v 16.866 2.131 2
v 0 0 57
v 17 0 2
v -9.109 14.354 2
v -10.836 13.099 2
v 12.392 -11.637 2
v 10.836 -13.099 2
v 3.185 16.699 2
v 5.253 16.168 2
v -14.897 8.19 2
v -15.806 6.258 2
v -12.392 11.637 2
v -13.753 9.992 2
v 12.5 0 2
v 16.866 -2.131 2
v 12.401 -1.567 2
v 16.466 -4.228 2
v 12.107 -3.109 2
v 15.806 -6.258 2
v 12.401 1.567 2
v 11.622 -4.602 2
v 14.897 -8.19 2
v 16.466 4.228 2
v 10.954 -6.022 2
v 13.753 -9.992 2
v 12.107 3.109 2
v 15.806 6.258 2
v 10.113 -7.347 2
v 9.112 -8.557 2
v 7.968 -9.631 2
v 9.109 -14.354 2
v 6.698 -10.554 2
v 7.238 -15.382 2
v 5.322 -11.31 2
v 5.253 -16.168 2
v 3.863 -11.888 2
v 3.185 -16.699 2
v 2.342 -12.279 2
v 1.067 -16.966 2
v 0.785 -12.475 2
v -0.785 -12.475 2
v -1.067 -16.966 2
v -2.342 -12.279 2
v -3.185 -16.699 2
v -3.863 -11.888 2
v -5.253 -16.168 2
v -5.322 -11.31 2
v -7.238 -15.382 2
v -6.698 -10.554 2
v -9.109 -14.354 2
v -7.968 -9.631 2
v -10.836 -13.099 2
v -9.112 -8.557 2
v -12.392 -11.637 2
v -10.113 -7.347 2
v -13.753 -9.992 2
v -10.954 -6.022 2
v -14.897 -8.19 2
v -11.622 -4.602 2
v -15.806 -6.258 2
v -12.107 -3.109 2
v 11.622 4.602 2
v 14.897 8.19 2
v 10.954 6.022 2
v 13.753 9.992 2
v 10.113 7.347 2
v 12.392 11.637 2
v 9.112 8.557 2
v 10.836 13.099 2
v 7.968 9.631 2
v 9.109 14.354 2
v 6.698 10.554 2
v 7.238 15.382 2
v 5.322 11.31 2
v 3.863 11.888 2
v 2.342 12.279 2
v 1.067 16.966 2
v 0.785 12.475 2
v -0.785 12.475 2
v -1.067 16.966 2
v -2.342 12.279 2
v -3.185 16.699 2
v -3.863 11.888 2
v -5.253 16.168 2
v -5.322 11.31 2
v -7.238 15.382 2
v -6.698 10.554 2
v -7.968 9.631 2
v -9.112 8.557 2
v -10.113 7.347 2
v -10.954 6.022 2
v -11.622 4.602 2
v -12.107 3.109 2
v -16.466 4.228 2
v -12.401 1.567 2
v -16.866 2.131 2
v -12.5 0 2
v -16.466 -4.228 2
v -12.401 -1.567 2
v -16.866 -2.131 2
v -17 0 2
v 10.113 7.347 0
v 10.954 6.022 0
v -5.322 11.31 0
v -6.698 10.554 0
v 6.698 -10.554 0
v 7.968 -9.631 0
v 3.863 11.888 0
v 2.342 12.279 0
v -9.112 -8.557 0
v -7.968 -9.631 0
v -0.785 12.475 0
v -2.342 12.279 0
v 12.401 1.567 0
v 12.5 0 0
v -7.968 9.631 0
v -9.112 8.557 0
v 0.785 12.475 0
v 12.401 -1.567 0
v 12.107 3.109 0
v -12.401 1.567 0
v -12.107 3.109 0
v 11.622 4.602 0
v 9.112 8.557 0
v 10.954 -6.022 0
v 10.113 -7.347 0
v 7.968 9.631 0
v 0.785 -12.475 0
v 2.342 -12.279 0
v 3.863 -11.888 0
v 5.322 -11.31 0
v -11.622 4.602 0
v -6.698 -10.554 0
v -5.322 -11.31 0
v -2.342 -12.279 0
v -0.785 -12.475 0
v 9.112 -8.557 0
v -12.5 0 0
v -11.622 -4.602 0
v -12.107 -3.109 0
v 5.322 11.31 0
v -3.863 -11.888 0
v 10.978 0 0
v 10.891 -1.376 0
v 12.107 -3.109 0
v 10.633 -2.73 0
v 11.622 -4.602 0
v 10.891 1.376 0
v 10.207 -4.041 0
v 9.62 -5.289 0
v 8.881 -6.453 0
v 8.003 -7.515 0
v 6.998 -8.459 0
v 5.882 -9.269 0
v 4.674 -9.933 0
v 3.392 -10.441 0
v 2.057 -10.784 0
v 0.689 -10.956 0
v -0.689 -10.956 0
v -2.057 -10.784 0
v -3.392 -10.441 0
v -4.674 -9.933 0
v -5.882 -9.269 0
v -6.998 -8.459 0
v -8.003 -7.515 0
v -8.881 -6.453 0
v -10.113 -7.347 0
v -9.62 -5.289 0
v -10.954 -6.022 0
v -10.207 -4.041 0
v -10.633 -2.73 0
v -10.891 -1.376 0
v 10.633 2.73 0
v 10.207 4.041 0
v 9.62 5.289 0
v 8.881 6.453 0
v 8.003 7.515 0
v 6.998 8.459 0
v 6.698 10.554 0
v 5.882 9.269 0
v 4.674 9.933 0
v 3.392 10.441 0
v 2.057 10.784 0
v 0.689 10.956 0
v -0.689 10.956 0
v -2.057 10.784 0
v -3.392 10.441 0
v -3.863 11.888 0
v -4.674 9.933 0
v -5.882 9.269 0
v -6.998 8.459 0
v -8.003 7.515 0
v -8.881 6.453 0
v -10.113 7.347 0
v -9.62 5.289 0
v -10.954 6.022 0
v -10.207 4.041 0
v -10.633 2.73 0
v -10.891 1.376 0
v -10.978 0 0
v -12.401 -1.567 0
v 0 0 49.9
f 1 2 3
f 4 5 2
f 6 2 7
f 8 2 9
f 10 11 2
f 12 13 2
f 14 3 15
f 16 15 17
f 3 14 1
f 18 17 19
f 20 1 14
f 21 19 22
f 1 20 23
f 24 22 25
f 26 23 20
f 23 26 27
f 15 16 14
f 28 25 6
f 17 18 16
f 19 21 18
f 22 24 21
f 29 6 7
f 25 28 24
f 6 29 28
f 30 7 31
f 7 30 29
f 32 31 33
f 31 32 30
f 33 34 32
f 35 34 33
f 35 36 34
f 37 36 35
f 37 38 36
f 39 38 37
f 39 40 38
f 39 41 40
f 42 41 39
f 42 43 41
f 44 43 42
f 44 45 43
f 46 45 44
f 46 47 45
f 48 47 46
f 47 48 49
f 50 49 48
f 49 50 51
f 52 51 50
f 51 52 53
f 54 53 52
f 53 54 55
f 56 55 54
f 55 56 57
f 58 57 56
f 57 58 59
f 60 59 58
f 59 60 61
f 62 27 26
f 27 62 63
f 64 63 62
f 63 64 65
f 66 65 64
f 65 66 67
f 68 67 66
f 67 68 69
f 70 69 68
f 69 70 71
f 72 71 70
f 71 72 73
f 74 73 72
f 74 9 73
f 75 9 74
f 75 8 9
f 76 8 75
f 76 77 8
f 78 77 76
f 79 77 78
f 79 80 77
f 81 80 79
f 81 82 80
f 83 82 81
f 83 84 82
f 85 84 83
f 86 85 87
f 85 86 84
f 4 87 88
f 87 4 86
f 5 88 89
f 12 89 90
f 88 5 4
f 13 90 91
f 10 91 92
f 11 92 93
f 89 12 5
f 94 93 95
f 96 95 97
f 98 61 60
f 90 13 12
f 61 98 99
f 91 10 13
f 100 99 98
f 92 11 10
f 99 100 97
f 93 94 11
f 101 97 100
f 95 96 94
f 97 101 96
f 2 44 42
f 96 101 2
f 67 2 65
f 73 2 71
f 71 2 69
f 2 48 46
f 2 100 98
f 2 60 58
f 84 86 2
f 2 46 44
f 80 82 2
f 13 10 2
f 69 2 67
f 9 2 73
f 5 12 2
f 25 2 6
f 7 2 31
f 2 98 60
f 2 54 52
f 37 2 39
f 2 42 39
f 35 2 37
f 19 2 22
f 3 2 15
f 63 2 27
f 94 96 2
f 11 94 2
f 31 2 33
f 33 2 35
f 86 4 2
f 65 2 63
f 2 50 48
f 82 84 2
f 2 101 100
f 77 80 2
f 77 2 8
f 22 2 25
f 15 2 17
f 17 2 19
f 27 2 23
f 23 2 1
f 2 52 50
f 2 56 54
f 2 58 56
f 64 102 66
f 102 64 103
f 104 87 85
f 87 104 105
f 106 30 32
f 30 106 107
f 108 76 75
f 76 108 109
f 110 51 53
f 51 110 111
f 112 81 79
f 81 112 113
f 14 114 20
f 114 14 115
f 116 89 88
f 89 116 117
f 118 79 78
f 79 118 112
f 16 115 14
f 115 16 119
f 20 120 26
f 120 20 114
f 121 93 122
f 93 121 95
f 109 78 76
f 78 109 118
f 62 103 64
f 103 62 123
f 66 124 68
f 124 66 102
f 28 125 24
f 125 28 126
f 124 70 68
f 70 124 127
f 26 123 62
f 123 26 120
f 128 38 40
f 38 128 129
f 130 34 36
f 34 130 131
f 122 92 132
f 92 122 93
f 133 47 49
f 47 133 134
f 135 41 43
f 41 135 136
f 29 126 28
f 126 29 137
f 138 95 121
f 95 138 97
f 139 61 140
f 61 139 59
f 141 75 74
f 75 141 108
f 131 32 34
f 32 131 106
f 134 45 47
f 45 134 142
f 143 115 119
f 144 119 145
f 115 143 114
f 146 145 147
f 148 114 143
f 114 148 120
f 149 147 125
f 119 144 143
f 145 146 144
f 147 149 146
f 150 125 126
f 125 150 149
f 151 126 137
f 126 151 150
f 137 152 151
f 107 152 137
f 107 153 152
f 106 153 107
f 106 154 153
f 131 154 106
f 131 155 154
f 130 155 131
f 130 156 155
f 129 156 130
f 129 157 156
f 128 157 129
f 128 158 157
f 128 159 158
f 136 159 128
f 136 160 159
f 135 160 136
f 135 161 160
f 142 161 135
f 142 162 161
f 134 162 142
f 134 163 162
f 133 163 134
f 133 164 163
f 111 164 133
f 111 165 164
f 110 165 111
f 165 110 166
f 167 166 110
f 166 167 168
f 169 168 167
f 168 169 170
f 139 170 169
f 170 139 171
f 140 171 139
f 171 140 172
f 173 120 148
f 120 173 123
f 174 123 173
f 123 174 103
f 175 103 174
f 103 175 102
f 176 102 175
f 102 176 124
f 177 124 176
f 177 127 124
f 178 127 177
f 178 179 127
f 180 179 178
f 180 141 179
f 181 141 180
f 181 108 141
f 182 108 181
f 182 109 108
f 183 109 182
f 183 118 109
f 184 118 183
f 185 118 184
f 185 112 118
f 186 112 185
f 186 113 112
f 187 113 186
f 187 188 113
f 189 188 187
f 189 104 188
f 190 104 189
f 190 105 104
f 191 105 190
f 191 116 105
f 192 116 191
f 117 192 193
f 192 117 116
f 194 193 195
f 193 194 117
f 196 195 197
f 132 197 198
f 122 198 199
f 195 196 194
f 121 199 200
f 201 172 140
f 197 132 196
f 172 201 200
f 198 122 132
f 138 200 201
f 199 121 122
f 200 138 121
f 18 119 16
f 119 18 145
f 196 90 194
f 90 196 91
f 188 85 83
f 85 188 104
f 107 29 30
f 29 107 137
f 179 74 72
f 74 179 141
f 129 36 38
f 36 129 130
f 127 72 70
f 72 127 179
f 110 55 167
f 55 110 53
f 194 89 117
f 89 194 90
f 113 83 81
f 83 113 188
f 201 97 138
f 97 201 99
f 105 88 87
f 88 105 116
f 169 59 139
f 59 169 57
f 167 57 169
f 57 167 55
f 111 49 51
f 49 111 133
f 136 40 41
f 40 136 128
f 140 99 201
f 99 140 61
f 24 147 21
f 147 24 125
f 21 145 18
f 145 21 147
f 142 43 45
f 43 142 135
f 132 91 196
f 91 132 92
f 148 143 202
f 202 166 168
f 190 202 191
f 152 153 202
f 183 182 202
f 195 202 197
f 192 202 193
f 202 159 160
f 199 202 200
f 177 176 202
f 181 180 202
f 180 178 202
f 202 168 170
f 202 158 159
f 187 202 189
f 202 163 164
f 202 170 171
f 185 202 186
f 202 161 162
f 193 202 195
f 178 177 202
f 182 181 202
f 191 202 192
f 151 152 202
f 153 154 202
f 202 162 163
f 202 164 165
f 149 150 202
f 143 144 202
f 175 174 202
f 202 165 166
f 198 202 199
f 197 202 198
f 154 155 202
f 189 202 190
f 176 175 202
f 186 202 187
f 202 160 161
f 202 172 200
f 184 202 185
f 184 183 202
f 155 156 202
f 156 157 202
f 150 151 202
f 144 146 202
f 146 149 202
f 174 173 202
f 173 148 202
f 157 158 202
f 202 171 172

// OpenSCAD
numbsteps=25;
numbRots=9;
totalHeight=104;

module BlinkyTree() {
	color([0,0.5,0,1]) {
		difference() {
			cylinder(totalHeight,38.5,7.25,$fn=50);
			for(i=[0:numbsteps*numbRots]) {
				rotate([0,0,(i%numbsteps)*(360/numbsteps)]) {
					translate([41.1-(31/(numbsteps*numbRots))*i,0,(totalHeight/(numbsteps*numbRots))*i])
						rotate([2.3+(5/(numbsteps*numbRots))*i,0,0])cube([8,10,13],center=true);
				}
			}
			translate([0,-3,85])cube([10,6,20]);
			translate([-25,-25,96])cube([50,50,20]);
		}
		translate([37,0,2.5])cube([5,5,5],center=true);
		translate([39,0,8])cube([3,5,16],center=true);
	}
}

module BlinkyDefuser() {
	color([0,0.5,0,1]) difference() {
		cylinder(totalHeight-2,48,17,$fn=50);
		translate([0,0,-0.02])cylinder(totalHeight-1.96,44,13,$fn=50);
		translate([40,-16,9.99])cube([16,40,20],center=true);
	}
}

module BlinkyDefuserCap() {
	difference() {
		union() {
			translate([0,0,totalHeight-2]) cylinder(55,17,0,$fn=50);
			translate([0,0,totalHeight-4]) cylinder(4,12.5,12.5,$fn=50);
		}
		translate([0,0,totalHeight-4.1]) cylinder(50,11,0,$fn=50);
	}
}

module BlinkyStarDefuserCap() {
	difference() {
		union() {
			translate([0,0,4-totalHeight]) BlinkyDefuserCap();
			scale([0.5,1,1])for (sp=[0:4]) translate([0,0,55*0.7071+1.55])rotate([sp*72,0,0])cylinder(50,17,0,$fn=4);
		}
		translate([0,0,-0.1]) cylinder(50,11,0,$fn=50);
	}
}

//BlinkyTree();
//BlinkyDefuser();
translate([0,0,4-totalHeight]) BlinkyDefuserCap();
//BlinkyStarDefuserCap();
